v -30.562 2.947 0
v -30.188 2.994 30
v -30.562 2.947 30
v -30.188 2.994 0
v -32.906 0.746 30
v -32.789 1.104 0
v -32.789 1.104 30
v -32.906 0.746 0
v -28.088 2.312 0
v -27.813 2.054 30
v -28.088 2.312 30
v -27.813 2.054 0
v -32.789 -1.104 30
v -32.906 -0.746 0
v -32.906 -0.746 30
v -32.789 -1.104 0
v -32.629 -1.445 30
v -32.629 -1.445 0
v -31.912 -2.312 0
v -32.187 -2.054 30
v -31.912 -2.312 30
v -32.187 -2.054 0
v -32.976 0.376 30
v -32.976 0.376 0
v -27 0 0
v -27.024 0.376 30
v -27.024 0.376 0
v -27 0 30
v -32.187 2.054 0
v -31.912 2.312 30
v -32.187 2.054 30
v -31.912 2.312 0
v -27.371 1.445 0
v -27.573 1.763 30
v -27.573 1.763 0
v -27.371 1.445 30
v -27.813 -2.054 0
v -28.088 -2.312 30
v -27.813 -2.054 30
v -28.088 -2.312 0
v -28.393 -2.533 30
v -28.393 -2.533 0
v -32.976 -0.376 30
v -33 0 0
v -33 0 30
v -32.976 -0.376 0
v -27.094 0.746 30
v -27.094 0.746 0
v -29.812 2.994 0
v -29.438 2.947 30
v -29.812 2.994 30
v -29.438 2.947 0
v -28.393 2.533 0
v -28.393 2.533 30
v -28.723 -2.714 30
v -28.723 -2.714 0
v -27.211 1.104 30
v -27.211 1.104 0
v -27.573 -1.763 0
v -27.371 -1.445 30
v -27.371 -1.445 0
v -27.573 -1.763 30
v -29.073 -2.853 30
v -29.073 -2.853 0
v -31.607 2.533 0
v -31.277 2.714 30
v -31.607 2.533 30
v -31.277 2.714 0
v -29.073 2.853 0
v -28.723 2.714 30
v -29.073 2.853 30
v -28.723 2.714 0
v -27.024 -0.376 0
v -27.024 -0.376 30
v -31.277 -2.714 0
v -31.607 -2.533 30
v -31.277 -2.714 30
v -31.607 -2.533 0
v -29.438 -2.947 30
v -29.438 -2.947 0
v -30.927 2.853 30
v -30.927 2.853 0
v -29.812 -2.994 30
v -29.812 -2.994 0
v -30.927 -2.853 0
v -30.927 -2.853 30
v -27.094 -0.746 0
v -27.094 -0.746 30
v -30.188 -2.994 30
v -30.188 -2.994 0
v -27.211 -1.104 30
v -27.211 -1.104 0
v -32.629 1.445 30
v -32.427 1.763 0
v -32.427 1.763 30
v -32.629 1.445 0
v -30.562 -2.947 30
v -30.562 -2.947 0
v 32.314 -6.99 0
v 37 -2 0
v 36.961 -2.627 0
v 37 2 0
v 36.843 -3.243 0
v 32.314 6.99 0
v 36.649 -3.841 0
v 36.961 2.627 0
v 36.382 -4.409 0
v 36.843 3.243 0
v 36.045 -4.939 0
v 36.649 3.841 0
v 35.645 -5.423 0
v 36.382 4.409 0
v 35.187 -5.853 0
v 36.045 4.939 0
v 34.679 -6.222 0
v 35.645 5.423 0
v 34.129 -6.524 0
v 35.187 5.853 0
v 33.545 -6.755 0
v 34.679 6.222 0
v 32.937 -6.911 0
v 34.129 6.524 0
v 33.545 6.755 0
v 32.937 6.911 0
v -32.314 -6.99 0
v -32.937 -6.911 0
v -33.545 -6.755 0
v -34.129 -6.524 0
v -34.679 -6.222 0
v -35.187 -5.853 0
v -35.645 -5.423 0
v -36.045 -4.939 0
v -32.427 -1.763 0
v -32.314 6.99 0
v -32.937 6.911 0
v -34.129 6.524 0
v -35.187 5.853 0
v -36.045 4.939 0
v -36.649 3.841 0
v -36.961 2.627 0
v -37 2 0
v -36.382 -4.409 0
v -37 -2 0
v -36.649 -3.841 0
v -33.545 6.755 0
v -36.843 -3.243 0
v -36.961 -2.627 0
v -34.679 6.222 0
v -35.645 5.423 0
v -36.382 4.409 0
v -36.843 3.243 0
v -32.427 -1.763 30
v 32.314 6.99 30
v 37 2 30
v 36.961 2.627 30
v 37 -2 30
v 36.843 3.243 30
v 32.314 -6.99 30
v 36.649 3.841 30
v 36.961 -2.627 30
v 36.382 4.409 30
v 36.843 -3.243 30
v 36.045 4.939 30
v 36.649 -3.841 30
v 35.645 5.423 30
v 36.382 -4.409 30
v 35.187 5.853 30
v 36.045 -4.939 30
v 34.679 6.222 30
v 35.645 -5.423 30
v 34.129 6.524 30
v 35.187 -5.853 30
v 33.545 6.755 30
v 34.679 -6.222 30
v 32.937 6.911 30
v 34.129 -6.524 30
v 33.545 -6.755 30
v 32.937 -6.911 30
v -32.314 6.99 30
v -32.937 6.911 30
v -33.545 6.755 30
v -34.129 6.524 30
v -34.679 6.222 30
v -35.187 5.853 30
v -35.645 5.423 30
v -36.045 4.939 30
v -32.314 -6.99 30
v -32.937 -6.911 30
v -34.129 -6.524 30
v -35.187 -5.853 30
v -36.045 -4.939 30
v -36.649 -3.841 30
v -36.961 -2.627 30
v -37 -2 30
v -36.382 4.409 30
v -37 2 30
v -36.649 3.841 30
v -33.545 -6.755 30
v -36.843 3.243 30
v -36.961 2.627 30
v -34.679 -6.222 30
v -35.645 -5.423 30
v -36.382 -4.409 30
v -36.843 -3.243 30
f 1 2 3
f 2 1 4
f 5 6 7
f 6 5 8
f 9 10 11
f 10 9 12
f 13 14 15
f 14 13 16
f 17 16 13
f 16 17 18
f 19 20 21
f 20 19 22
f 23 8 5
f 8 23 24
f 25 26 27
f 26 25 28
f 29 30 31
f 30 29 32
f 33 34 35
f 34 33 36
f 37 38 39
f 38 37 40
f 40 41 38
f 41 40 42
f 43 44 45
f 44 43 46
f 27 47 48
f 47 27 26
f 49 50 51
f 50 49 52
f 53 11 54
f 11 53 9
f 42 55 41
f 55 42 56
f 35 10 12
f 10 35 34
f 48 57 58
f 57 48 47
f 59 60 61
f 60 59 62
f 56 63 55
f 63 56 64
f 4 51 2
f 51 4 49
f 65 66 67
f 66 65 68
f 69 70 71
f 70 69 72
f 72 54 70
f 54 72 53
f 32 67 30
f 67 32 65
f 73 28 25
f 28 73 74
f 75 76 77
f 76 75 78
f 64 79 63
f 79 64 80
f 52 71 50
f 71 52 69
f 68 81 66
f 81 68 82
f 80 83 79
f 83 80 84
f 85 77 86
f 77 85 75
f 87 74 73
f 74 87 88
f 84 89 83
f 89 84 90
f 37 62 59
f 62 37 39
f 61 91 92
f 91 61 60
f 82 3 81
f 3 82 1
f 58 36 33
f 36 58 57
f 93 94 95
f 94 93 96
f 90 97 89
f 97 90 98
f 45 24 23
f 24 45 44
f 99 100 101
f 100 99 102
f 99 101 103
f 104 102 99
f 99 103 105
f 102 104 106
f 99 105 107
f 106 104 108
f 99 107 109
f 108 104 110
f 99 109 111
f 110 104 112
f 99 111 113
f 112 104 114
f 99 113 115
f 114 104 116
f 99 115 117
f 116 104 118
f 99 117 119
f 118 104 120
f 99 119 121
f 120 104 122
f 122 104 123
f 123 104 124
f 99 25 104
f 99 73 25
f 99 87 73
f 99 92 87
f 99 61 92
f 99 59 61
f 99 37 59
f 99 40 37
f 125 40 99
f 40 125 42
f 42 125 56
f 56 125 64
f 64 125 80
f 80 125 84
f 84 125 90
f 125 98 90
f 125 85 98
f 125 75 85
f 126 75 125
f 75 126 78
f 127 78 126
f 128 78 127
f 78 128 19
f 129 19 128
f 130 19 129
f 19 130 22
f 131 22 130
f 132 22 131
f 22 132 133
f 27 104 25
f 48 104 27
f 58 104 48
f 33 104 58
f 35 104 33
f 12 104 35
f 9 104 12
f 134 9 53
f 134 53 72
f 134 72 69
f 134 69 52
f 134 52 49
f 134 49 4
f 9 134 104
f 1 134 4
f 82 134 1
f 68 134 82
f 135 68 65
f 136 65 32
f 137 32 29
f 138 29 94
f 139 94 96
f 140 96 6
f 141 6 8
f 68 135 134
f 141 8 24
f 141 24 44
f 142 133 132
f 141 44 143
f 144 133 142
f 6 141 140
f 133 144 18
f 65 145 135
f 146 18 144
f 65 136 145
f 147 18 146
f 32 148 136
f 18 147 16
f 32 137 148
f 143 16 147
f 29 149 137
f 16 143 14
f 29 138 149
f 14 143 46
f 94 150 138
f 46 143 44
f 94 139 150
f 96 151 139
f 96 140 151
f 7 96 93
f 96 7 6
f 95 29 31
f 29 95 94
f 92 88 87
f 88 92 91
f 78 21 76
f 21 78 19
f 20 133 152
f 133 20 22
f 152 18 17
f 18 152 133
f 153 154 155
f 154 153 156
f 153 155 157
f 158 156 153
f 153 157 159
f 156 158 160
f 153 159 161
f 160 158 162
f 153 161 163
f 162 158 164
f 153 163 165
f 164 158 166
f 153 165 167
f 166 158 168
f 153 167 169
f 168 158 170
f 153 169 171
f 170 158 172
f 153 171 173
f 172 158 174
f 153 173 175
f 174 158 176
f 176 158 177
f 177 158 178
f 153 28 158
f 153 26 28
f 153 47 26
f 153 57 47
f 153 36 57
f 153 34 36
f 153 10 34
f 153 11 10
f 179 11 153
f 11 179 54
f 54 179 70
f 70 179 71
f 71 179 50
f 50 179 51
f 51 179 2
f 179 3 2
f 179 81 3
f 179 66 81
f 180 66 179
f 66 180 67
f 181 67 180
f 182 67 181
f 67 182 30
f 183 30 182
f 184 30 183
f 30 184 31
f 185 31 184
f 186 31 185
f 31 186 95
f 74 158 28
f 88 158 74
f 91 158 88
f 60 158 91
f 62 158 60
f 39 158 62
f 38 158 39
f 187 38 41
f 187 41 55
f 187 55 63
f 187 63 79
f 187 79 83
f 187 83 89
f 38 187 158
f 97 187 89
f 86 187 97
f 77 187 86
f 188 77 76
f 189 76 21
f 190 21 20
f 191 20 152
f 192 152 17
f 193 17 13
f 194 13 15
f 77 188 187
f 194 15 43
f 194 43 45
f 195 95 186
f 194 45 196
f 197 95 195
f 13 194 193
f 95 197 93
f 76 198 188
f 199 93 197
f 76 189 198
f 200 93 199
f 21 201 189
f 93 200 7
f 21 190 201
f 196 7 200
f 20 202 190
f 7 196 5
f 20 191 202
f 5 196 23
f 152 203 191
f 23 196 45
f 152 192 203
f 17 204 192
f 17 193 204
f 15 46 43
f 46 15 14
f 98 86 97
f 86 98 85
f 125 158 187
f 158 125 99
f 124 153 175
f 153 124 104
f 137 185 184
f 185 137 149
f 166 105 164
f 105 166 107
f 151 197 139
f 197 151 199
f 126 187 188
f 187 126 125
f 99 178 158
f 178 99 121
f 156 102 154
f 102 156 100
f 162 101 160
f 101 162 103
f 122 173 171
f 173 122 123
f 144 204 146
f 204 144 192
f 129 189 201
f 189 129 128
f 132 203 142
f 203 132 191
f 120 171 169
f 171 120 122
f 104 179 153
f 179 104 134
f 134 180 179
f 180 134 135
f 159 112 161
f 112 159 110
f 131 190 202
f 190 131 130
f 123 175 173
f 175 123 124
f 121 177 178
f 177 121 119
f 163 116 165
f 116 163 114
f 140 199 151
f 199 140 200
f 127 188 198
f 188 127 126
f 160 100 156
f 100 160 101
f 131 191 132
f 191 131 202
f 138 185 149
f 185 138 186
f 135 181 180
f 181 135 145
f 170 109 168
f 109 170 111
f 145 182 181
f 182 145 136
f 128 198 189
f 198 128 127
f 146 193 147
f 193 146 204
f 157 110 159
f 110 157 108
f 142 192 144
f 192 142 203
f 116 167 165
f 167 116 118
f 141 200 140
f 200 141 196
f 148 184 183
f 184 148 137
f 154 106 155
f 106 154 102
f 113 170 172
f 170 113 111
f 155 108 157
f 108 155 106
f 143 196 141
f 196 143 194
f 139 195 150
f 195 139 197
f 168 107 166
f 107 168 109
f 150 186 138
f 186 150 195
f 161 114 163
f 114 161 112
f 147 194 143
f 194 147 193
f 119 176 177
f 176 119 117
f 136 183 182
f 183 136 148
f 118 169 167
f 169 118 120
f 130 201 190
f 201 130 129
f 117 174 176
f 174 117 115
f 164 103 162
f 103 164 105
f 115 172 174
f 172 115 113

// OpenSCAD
$fn = 50;


difference() {
	union() {
		hull() {
			translate(v = [-32.0000000000, 2.0000000000, 0]) {
				cylinder(h = 30, r = 5);
			}
			translate(v = [32.0000000000, 2.0000000000, 0]) {
				cylinder(h = 30, r = 5);
			}
			translate(v = [-32.0000000000, -2.0000000000, 0]) {
				cylinder(h = 30, r = 5);
			}
			translate(v = [32.0000000000, -2.0000000000, 0]) {
				cylinder(h = 30, r = 5);
			}
		}
	}
	union() {
		translate(v = [-30.0000000000, 0.0000000000, 0]) {
			cylinder(h = 30, r = 3.0000000000);
		}
		translate(v = [-30.0000000000, 0.0000000000, 0]) {
			cylinder(h = 30, r = 1.5000000000);
		}
		translate(v = [-30.0000000000, 0.0000000000, 0]) {
			cylinder(h = 30, r = 1.5000000000);
		}
		translate(v = [-30.0000000000, 0.0000000000, 0]) {
			cylinder(h = 30, r = 1.5000000000);
		}
	}
}
